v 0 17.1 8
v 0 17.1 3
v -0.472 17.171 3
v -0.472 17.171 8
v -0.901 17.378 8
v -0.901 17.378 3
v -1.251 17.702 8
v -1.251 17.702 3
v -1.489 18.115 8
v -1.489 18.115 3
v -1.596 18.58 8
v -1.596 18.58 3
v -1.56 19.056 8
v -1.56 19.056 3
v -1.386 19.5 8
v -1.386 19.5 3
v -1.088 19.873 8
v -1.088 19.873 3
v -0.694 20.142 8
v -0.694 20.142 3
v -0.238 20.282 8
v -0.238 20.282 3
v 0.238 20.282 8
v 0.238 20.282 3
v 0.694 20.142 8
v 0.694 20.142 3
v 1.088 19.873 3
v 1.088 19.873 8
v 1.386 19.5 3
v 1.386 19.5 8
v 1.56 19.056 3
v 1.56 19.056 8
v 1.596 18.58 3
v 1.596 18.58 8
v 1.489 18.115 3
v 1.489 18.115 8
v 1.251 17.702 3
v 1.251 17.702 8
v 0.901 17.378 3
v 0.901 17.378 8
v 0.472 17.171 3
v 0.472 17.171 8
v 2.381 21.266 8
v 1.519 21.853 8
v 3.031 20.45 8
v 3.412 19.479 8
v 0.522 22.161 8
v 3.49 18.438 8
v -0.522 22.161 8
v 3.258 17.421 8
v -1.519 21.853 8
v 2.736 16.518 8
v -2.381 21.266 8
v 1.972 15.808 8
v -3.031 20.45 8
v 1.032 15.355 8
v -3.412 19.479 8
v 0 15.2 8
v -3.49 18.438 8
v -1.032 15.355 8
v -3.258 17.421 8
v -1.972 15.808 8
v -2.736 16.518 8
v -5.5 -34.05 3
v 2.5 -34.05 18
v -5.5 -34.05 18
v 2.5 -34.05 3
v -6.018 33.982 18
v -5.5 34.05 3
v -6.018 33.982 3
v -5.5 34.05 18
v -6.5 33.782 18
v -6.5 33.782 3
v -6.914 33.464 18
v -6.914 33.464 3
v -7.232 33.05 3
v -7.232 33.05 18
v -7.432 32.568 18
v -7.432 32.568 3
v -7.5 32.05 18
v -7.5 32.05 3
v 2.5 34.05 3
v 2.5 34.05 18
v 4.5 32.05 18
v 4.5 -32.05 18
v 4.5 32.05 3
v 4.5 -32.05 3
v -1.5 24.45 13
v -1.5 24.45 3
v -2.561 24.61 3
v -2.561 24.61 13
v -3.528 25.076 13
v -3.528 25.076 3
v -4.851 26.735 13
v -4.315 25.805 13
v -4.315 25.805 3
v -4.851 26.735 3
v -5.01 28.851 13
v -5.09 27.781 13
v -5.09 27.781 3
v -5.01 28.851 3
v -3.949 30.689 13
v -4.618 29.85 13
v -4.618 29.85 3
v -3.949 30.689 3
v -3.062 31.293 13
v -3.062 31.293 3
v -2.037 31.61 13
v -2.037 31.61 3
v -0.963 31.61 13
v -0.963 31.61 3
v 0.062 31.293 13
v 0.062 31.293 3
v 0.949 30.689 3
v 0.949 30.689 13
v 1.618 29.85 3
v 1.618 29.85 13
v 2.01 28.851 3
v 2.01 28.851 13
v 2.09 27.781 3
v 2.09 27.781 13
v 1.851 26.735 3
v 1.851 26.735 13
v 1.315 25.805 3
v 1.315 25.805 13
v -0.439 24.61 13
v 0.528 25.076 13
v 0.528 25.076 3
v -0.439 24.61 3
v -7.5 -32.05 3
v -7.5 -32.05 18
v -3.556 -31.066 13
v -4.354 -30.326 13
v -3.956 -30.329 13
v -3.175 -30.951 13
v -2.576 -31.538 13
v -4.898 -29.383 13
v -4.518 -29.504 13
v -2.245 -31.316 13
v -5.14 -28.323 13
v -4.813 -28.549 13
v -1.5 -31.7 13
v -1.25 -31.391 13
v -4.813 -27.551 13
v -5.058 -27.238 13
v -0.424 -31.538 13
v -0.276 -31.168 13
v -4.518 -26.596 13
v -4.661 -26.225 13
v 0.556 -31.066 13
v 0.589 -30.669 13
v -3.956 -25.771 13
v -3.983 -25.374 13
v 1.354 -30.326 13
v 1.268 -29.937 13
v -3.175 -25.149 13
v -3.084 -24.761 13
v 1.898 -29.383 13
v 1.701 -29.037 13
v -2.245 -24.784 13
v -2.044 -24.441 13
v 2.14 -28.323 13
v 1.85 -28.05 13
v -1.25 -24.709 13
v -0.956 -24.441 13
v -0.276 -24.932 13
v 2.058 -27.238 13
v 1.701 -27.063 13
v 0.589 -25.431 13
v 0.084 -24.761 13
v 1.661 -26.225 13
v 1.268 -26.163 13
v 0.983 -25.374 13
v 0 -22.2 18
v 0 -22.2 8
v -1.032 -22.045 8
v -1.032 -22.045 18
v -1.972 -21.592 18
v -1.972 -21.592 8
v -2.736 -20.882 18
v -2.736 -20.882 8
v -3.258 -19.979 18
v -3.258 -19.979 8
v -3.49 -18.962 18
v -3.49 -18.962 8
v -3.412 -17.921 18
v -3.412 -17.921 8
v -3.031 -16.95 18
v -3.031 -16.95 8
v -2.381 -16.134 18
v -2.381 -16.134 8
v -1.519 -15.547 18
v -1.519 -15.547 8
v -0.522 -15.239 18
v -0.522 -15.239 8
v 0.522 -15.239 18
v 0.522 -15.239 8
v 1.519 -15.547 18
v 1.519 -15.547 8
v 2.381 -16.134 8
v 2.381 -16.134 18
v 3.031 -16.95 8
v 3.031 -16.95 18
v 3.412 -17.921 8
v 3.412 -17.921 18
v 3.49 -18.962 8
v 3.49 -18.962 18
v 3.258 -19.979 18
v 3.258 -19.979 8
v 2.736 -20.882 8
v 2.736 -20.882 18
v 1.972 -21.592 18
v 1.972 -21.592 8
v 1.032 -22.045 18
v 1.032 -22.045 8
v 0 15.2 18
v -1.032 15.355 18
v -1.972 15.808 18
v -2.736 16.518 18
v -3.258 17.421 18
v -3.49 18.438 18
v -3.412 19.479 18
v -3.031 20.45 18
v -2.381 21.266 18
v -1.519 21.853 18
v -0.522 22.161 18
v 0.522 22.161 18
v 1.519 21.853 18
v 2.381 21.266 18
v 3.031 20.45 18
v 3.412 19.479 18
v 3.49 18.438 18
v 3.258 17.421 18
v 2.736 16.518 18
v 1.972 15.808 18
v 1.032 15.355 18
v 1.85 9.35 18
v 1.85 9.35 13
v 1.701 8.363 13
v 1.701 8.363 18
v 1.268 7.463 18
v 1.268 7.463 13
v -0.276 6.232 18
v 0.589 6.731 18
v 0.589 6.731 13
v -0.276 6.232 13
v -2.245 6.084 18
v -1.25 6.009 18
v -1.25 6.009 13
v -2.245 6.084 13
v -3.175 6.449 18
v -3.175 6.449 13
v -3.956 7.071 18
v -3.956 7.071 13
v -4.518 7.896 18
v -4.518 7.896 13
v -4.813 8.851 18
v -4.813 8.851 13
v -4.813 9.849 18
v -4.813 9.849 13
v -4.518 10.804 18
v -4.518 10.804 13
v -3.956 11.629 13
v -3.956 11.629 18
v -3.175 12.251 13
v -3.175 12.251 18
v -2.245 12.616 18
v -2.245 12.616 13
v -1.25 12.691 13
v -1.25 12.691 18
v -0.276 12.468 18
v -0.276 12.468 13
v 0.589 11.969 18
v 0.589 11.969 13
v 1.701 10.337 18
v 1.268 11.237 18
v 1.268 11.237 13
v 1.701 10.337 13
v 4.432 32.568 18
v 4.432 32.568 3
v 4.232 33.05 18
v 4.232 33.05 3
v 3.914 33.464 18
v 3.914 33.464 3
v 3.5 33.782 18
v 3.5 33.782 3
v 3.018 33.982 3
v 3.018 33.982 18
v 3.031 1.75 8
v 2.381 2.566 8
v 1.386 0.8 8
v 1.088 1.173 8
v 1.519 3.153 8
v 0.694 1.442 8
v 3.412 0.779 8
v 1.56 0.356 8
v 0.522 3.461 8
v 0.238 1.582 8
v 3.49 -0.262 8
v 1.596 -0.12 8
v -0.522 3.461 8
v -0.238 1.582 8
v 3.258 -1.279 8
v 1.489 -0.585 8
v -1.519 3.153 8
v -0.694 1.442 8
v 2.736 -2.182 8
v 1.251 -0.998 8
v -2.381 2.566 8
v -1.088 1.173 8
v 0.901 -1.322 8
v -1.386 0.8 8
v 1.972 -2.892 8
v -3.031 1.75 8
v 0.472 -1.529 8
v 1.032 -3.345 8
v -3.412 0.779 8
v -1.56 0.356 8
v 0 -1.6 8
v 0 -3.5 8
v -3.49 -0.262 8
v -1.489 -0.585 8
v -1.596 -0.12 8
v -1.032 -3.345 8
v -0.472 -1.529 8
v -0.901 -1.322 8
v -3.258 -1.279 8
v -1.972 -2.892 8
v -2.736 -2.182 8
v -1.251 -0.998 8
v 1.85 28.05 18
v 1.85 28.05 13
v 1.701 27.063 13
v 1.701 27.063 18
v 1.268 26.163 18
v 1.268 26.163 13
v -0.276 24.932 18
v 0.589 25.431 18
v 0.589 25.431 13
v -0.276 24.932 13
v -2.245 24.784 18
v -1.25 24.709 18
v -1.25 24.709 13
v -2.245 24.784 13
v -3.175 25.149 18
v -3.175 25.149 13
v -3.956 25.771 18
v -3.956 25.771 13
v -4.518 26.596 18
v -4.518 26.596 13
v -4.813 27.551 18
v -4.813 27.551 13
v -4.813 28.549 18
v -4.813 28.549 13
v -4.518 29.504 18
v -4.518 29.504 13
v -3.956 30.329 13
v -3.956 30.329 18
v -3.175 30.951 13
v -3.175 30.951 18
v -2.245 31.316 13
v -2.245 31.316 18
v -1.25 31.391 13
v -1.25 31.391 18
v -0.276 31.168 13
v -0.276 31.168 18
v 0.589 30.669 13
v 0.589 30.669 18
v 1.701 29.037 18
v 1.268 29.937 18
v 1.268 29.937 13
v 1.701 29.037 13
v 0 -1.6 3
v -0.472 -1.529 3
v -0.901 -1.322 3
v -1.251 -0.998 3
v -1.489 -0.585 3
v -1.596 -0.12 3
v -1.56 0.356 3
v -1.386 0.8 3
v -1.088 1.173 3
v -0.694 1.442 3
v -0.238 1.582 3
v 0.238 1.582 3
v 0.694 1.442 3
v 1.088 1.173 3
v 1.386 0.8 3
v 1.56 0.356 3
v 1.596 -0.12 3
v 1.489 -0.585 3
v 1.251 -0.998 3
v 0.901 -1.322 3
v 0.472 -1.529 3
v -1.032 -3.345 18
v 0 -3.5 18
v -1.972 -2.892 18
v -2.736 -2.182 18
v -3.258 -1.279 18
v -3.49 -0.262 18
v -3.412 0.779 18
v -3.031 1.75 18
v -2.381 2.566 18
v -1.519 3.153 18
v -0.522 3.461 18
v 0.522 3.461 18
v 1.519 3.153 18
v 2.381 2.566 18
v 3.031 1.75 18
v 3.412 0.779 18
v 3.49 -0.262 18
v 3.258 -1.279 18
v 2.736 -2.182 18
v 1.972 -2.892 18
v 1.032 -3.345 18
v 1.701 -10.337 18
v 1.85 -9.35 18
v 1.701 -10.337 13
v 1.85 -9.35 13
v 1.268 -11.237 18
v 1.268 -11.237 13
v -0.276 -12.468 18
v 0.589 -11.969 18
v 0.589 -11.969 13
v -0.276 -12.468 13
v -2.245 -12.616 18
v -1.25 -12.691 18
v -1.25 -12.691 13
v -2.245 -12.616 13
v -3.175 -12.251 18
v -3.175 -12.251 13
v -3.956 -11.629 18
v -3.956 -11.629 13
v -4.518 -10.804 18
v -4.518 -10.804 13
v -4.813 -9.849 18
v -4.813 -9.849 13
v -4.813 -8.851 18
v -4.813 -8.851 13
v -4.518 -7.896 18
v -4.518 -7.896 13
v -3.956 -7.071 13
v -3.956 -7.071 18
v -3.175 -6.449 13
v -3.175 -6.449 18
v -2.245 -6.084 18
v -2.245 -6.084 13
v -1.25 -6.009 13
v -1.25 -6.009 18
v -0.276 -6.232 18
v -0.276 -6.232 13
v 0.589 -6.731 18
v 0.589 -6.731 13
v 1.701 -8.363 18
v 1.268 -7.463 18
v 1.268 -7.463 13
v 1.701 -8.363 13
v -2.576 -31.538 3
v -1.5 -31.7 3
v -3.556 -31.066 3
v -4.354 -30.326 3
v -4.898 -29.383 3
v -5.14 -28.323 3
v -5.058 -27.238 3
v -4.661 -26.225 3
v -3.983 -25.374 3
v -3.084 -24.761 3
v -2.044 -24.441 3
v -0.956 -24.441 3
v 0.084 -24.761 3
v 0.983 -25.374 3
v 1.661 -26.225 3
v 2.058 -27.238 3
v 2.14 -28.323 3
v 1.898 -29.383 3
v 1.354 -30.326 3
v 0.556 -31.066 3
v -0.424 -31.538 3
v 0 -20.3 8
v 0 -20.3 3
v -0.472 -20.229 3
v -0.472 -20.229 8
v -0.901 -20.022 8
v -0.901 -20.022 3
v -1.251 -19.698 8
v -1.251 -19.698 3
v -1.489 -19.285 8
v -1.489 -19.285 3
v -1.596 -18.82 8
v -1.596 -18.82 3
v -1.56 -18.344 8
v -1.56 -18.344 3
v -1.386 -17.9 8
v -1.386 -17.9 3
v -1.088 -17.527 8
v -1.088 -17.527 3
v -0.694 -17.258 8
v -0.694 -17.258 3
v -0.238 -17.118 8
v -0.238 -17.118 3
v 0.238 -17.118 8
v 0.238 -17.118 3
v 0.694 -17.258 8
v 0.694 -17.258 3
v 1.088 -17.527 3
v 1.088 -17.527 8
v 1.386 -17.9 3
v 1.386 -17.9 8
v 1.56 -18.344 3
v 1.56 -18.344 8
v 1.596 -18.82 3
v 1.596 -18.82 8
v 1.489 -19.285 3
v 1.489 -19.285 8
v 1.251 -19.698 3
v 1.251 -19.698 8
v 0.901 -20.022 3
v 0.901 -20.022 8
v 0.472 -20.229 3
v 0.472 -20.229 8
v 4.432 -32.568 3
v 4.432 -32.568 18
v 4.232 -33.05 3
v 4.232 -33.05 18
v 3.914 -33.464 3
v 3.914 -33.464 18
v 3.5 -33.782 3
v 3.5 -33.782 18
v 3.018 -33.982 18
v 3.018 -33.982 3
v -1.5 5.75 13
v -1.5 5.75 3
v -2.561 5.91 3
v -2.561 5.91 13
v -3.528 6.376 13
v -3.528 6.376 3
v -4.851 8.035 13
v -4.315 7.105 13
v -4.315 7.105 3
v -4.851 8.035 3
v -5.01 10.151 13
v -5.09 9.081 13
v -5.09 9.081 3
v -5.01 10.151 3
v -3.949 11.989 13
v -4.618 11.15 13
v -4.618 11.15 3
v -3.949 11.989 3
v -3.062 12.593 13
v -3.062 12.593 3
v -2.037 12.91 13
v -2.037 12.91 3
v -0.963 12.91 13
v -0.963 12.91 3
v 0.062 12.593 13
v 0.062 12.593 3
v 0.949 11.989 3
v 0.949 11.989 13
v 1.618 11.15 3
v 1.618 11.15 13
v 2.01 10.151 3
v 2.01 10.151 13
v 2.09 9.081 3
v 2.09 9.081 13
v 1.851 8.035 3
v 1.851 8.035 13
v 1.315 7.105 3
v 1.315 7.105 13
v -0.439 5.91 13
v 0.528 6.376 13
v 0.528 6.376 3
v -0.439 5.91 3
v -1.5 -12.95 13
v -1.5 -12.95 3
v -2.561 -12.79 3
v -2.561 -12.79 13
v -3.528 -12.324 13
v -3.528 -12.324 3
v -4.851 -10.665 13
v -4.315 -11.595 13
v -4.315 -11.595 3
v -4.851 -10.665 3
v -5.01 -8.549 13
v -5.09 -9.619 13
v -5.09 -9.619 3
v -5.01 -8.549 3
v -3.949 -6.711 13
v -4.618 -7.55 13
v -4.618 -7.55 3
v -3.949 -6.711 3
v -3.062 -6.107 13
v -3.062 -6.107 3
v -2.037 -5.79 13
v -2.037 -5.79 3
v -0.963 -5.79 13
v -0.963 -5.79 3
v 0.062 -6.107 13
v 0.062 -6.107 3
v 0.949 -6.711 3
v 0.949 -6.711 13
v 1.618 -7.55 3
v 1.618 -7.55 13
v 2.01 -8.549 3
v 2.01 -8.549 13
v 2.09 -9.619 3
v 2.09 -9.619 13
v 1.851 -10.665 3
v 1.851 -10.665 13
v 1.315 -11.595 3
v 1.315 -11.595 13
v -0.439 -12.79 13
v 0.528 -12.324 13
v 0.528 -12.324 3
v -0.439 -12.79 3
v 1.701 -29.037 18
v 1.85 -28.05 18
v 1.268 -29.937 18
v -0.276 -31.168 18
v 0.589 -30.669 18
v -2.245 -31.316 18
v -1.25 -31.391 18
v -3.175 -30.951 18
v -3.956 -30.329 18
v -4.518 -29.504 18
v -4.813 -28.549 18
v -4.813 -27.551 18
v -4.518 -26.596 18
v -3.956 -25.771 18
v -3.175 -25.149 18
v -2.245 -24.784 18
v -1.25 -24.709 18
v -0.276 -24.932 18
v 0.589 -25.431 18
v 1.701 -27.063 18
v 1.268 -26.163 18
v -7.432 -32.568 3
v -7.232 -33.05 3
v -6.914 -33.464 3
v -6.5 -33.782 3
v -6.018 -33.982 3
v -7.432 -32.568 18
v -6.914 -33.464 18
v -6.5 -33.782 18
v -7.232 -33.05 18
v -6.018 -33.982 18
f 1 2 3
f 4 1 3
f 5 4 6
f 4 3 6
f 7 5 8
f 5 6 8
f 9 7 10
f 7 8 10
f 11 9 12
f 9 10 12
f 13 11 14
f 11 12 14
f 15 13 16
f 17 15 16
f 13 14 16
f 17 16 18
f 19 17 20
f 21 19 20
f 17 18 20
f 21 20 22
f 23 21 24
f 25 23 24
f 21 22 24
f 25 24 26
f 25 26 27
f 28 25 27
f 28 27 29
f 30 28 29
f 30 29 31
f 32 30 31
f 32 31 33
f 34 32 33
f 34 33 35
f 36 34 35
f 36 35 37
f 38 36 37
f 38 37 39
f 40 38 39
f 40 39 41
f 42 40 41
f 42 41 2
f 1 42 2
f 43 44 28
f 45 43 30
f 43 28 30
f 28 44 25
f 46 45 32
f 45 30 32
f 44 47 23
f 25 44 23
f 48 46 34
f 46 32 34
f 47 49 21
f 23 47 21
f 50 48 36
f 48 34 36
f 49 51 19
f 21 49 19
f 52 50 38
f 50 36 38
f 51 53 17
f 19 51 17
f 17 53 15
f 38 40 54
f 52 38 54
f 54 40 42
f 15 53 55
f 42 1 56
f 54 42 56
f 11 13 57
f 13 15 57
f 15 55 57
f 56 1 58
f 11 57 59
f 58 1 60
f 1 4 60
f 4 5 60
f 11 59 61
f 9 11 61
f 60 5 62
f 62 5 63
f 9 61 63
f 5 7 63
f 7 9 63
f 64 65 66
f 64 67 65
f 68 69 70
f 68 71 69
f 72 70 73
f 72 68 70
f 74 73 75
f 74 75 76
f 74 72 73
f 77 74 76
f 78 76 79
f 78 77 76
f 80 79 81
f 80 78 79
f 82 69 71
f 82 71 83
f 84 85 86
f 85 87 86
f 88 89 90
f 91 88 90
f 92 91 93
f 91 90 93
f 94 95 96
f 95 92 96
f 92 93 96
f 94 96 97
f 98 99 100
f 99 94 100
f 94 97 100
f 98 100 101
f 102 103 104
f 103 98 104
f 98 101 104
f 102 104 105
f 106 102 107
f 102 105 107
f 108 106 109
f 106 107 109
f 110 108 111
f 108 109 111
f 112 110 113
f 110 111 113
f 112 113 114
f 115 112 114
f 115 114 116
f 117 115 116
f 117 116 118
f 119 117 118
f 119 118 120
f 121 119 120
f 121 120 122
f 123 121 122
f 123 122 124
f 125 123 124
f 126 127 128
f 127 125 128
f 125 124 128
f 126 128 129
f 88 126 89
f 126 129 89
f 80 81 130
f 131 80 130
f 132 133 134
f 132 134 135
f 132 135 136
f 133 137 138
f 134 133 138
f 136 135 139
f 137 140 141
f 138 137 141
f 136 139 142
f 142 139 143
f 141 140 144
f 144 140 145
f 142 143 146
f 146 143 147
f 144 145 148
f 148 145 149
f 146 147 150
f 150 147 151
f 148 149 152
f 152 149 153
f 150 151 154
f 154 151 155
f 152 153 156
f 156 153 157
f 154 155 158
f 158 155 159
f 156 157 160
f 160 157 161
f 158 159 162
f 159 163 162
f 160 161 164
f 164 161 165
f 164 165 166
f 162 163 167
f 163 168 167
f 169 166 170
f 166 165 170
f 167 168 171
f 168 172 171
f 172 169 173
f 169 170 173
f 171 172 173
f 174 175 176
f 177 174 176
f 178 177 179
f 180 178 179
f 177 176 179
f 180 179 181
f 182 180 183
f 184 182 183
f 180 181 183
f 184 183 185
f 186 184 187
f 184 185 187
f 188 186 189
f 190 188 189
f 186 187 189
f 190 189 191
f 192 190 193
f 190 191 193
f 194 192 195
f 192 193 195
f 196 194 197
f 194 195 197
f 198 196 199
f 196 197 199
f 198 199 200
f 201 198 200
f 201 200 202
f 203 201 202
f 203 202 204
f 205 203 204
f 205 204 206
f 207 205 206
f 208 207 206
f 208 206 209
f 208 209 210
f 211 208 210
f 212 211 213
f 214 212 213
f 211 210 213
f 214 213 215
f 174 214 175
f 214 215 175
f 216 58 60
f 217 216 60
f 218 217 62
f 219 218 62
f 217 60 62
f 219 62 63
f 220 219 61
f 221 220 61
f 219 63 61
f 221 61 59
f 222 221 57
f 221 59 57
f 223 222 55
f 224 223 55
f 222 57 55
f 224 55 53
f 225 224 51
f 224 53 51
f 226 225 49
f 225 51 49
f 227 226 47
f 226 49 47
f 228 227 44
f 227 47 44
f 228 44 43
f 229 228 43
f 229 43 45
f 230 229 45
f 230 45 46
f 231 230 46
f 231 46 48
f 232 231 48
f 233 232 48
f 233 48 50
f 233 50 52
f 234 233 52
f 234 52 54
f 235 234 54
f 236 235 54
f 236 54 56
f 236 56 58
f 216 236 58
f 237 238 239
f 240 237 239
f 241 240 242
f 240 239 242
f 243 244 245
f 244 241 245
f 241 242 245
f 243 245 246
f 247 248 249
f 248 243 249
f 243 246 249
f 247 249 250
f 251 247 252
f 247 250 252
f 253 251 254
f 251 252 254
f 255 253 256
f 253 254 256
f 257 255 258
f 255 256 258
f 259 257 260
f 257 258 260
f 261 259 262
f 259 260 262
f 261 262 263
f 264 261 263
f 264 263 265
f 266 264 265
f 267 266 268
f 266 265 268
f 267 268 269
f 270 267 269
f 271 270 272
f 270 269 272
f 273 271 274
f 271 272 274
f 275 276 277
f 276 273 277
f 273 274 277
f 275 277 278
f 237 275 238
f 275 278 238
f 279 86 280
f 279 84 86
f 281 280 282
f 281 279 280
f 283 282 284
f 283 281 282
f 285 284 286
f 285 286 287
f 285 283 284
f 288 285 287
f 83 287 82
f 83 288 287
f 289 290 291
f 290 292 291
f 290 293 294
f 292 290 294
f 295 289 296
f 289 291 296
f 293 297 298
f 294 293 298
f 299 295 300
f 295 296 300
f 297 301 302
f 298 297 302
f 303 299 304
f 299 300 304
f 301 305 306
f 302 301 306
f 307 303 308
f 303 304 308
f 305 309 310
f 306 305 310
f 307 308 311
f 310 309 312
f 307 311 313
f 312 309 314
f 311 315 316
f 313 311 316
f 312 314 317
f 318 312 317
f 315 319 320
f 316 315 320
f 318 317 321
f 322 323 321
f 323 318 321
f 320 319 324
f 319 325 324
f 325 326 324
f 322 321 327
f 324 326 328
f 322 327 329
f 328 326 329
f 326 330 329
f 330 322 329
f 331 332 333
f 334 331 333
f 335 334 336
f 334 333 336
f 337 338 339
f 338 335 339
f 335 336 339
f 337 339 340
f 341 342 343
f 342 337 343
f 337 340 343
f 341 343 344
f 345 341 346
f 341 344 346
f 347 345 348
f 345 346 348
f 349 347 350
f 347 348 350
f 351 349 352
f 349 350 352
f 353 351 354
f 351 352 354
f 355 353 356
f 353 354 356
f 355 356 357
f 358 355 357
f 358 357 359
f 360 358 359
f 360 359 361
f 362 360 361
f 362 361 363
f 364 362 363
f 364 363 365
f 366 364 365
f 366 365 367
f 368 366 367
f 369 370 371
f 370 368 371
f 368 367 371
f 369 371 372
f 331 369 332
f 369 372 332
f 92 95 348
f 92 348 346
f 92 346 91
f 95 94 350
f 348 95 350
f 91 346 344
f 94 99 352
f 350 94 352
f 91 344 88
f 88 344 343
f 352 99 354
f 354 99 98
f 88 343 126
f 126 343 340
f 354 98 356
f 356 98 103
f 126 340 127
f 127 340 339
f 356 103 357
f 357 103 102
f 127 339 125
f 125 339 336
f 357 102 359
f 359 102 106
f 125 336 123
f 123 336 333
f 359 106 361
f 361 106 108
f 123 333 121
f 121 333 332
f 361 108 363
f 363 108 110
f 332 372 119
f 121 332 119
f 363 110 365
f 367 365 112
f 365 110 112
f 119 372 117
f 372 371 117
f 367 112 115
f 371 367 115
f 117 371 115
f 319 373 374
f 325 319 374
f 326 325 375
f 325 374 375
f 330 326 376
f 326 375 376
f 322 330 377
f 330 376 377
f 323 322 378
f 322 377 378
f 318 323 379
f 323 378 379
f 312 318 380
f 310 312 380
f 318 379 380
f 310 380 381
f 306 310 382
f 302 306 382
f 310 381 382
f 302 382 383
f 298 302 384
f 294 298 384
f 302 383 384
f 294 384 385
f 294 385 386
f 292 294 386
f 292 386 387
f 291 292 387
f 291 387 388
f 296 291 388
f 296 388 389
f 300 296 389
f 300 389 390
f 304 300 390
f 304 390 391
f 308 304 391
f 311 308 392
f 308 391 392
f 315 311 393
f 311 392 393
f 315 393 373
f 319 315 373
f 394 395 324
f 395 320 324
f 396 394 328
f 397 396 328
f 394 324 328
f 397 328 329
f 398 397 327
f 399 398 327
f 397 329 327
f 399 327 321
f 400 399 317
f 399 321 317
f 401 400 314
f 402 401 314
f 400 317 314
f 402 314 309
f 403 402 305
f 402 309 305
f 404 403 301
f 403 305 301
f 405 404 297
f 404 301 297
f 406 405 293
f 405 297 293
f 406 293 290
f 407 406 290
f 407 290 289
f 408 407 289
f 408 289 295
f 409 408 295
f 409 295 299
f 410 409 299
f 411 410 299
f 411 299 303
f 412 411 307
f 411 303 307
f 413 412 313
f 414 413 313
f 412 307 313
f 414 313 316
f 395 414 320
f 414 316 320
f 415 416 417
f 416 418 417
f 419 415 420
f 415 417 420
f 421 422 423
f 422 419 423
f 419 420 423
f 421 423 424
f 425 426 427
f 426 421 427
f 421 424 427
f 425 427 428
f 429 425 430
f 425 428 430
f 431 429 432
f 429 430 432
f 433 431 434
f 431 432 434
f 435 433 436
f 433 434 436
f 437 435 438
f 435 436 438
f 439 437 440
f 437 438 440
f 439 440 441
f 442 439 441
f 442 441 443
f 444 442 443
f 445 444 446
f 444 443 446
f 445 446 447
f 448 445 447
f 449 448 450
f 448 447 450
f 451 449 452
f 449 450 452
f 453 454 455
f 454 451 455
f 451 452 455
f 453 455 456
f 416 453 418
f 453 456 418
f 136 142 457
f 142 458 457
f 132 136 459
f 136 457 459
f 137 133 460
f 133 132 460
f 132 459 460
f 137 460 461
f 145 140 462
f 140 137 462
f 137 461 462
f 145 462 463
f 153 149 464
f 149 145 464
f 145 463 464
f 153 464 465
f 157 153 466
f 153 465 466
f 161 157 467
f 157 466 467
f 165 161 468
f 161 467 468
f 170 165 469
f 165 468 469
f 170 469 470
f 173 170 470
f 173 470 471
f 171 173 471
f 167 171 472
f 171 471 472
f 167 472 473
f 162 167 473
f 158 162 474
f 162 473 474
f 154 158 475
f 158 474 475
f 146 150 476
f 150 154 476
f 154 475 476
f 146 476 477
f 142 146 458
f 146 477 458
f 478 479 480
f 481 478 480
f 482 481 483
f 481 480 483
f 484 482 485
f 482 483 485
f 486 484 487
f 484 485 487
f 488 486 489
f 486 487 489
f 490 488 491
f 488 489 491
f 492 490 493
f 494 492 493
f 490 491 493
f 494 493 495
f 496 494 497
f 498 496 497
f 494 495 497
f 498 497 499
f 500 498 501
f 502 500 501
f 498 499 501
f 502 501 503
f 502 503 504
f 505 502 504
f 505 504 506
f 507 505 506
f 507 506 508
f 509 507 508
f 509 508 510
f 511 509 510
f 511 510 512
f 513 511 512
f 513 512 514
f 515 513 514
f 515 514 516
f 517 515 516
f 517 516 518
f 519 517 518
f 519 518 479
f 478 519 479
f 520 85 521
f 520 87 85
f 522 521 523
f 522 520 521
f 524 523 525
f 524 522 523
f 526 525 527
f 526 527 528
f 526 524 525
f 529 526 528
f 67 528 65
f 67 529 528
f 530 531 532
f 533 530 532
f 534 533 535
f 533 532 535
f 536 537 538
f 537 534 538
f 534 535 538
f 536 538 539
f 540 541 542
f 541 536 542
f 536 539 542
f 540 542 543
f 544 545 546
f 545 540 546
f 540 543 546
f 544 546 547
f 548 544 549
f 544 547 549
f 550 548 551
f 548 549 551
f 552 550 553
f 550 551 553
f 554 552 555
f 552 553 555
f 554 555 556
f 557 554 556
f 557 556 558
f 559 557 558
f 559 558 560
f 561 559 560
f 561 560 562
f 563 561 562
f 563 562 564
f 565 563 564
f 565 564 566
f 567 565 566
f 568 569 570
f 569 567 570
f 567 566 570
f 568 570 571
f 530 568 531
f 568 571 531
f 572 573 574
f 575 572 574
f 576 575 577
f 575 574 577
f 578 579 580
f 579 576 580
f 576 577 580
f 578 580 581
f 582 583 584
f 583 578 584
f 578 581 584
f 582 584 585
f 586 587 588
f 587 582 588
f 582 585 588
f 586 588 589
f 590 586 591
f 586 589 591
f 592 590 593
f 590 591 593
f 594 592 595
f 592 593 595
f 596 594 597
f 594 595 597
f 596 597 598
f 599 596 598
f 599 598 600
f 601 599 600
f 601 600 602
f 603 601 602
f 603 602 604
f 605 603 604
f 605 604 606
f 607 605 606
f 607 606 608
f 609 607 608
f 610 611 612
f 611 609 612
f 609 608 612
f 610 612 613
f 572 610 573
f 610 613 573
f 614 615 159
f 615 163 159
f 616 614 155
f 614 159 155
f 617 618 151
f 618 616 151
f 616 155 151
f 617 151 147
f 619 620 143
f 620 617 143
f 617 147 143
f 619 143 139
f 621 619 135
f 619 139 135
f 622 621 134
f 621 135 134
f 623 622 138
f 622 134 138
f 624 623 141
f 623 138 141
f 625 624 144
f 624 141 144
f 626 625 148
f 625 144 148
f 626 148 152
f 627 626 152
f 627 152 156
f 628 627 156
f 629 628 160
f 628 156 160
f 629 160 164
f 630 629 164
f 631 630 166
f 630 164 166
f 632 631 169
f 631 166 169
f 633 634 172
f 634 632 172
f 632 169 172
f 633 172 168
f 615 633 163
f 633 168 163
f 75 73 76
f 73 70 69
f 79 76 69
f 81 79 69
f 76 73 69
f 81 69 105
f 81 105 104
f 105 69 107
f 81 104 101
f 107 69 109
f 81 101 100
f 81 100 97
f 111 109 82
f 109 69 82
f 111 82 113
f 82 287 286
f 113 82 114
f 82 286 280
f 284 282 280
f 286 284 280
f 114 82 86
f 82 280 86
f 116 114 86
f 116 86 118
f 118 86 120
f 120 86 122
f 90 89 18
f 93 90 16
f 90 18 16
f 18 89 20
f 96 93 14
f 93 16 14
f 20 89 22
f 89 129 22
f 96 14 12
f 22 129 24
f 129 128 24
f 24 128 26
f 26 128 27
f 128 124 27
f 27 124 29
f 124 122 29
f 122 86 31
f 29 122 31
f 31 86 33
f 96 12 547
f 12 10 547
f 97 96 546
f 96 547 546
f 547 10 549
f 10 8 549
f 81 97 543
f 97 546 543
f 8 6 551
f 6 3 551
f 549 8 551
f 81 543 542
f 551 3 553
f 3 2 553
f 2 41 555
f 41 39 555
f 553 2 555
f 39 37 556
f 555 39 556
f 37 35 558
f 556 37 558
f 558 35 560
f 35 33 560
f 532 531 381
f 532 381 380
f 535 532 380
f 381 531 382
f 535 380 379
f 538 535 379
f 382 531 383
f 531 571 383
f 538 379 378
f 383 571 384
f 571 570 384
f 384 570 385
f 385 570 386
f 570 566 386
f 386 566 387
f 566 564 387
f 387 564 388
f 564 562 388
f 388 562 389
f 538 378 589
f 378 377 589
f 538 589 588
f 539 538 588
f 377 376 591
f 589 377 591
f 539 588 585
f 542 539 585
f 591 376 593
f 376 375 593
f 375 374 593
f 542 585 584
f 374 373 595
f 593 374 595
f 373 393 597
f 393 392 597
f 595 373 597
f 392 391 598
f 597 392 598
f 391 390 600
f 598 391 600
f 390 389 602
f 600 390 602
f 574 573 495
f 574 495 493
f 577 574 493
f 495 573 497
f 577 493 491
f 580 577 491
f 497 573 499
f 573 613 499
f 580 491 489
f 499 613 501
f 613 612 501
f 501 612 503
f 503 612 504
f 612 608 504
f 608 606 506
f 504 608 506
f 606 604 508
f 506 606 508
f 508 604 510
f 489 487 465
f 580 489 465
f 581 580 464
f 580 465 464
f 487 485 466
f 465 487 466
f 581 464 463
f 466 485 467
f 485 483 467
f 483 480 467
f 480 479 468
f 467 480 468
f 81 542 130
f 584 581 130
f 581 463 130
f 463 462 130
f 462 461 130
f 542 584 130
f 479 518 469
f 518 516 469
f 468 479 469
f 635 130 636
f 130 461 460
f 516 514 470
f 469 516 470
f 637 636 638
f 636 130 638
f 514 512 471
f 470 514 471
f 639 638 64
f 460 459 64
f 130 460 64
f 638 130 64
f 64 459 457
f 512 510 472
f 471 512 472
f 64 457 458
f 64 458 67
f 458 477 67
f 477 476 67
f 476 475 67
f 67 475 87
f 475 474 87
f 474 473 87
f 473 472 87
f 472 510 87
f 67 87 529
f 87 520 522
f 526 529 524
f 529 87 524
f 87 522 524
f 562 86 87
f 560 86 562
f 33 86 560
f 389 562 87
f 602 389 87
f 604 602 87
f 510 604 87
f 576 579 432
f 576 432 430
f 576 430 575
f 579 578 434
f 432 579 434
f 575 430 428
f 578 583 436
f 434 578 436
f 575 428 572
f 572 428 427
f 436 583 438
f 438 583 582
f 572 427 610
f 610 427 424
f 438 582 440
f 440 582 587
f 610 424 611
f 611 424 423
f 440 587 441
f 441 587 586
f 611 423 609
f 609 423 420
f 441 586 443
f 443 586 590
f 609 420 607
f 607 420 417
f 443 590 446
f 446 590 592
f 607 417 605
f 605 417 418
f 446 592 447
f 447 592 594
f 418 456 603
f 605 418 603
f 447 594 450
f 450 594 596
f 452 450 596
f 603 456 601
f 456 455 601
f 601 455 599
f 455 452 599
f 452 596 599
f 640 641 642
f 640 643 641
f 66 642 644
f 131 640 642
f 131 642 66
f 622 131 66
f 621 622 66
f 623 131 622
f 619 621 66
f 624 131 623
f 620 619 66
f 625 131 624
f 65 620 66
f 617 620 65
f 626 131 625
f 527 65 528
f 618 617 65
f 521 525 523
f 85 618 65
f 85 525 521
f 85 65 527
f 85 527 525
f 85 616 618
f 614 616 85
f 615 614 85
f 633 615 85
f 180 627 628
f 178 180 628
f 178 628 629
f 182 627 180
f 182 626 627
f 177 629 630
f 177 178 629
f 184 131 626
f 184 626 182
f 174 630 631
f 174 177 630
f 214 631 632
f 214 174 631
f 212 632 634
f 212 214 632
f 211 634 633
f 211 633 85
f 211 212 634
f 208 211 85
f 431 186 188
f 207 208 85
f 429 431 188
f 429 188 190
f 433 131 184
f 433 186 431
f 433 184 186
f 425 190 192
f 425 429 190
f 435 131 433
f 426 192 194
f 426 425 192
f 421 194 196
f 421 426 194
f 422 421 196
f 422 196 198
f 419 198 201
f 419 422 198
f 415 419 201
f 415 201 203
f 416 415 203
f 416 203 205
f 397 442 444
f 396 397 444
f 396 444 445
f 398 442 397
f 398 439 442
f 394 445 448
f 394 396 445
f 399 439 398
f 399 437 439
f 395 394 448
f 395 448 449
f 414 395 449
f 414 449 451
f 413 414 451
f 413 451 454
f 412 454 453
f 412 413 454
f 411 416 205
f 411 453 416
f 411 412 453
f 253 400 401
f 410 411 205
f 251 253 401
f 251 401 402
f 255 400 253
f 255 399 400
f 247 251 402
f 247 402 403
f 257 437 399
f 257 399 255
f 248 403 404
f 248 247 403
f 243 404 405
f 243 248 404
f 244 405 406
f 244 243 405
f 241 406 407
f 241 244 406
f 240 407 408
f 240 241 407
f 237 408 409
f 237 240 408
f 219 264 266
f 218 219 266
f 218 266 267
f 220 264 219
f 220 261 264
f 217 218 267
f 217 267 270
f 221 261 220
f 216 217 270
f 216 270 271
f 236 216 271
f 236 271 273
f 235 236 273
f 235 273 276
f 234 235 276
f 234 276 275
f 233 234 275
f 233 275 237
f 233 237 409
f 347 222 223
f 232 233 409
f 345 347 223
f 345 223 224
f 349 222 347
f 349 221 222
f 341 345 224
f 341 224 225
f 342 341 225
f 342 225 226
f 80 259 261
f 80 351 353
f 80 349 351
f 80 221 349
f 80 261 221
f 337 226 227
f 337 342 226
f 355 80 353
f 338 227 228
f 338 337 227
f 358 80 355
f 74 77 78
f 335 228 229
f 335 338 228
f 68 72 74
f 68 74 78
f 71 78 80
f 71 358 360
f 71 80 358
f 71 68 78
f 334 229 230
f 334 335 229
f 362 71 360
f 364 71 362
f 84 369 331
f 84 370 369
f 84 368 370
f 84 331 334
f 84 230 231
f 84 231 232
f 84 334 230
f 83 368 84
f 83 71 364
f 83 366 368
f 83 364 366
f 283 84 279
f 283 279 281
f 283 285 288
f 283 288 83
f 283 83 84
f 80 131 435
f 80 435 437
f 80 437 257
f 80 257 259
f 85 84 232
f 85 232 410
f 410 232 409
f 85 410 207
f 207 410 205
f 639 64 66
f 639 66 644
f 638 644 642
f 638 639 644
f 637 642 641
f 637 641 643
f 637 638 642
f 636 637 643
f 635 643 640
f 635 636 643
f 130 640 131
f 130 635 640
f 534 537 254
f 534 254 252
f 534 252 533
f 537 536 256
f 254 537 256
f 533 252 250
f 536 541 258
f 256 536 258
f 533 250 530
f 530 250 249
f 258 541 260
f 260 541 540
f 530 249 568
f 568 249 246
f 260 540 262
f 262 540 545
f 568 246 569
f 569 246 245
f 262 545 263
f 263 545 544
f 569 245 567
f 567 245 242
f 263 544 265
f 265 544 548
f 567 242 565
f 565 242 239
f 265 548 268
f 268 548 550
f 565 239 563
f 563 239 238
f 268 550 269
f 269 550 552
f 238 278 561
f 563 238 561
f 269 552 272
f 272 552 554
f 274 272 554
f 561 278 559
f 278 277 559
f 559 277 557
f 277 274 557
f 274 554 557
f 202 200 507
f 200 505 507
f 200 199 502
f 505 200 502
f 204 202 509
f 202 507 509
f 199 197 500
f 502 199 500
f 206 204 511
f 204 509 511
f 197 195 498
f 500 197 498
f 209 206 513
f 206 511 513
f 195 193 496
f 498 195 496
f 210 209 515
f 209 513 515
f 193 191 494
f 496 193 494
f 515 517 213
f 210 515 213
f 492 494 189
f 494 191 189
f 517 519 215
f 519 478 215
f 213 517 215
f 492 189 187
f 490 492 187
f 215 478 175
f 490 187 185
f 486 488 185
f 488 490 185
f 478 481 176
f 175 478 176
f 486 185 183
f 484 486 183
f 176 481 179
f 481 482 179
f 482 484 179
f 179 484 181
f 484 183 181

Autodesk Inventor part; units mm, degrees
ref_plane "YZ Plane" through (0, 0, 0) normal (1, 0, 0) x (0, 1, 0)
ref_plane "XZ Plane" through (0, 0, 0) normal (0, 1, 0) x (-1, 0, 0)
ref_plane "XY Plane" through (0, 0, 0) normal (0, 0, 1) x (1, 0, 0)
ref_plane "Arbeitsebene1" through (0, 0, 0) normal (0, 0, 1) x (1, 0, 0)
ref_plane "Arbeitsebene2" through (-1.5, 28.05, 3) normal (0, 0, 1) x (0, -1, 0)
sketch "Skizze2" plane through (-1.5, 28.05, 3) normal (0, 0, 1) x (0, -1, 0)
  circle A0 centre (56.1, 0) radius 4 construction
  circle A1 centre (56.1, 0) radius 3.65
  circle A2 centre (37.4, 0) radius 4 construction
  circle A3 centre (18.7, 0) radius 4 construction
  line L0 (6.2, -3) -> (-6.2, -3) construction
  circle A4 centre (0, 0) radius 4 construction
  circle A5 centre (37.4, 0) radius 3.6
  circle A6 centre (18.7, 0) radius 3.6
  circle A7 centre (0, 0) radius 3.6
  circle A8 centre (66, 1.5) radius 1.4 construction
  circle A9 centre (46.75, 1.5) radius 1.4 construction
  circle A10 centre (28.05, 1.5) radius 1.4 construction
  circle A11 centre (9.35, 1.5) radius 1.4 construction
  circle A12 centre (-9.9, 1.5) radius 1.4 construction
  circle A13 centre (66, 1.5) radius 1.6
  circle A14 centre (46.75, 1.5) radius 1.6
  circle A15 centre (28.05, 1.5) radius 1.6
  circle A16 centre (9.35, 1.5) radius 1.6
  circle A17 centre (-9.9, 1.5) radius 1.6
  line L1 (6, 6) -> (6, -6) projected
  line L2 (-6, 6) -> (6, 6) projected
  line L3 (-6, -6) -> (-6, 6) projected
  line L4 (6, -6) -> (-6, -6) projected
  circle A18 centre (0, 0) radius 4 projected
  line L5 (62.1, 6) -> (62.1, -6) projected
  line L6 (50.1, 6) -> (62.1, 6) projected
  line L7 (50.1, -6) -> (50.1, 6) projected
  line L8 (62.1, -6) -> (50.1, -6) projected
  circle A19 centre (56.1, 0) radius 4 projected
  line L9 (69.1, 6) -> (-12.4207, 6)
  line L10 (-12.4207, 6) -> (-12.4207, -6)
  line L11 (-12.4207, -6) -> (69.1, -6)
  line L12 (69.1, -6) -> (69.1, 6)
  point P0 (28.05, 1.5)
  point P1 (50.1, 6)
  point P2 (6, 6)
  point P3 (6, -6)
  dimension "d0" = 7.3
  dimension "d1" = 7.2
  dimension "d2" = 7.2
  dimension "d3" = 7.2
  dimension "d4" = 3.2
  dimension "d5" = 3.2
  dimension "d6" = 3.2
  dimension "d7" = 3.2
  dimension "d8" = 3.2
  dimension "d9" = 7
extrude "Extrusion1" add sketch "Skizze2" along normal blind 10 contours L9 L7 L11 L1 | L1 L4 L3 L2 | L6 L5 L8 L7 | A18 | A19
sketch "Skizze3" plane through (-1.5, 28.05, 13) normal (0, 0, 1) x (1, 0, 0)
  line L0 (-6, 6) -> (-6, -62.1) projected
  line L1 (-6, -62.1) -> (6, -62.1) projected
  line L2 (6, -62.1) -> (6, 6) projected
  line L3 (6, 6) -> (-6, 6) projected
  circle A0 centre (1.5, -9.35) radius 1.6 projected
  circle A1 centre (1.5, -28.05) radius 1.6 projected
  circle A2 centre (1.5, -46.75) radius 1.6 projected
  circle A3 centre (0, -18.7) radius 3.6 projected
  circle A4 centre (0, -37.4) radius 3.6 projected
  circle A5 centre (0, 0) radius 3.6 projected
  circle A6 centre (0, -56.1) radius 3.35
  circle A7 centre (0, -37.4) radius 3.6 projected
  circle A8 centre (0, -37.4) radius 3.35
  circle A9 centre (0, -18.7) radius 3.6 projected
  circle A10 centre (0, -18.7) radius 3.35
  circle A11 centre (0, 0) radius 3.35
  point P0 (1.5, -28.05)
  dimension "d12" = 6.7
  dimension "d13" = 6.7
  dimension "d14" = 6.7
  dimension "d15" = 6.7
extrude "Extrusion2" add sketch "Skizze3" along normal blind 5 contours L3 L2 L1 L0 | A3 | A4 | A5
sketch "Skizze4" plane through (-1.5, 28.05, 18) normal (0, 0, 1) x (1, 0, 0)
  circle A0 centre (1.5, -46.75) radius 1.6 projected
  circle A1 centre (1.5, -28.05) radius 1.6 projected
  circle A2 centre (1.5, -9.35) radius 1.6 projected
  point P0 (1.5, -28.05)
hole "Bohrung1" at (0, -18.7, 18) at (0, 0, 18) at (0, 18.7, 18) direction (0, 0, -1) diameter 3.2 end through all counterbore diameter 7 counterbore depth 10
fillet "Rundung1" radius 2 4 edges at (4.5, -34.05, 10.5) (-7.5, -34.05, 10.5) (-7.5, 34.05, 10.5) (4.5, 34.05, 10.5)
properties part number "Omniscope_USBC_Bar_lenses"
